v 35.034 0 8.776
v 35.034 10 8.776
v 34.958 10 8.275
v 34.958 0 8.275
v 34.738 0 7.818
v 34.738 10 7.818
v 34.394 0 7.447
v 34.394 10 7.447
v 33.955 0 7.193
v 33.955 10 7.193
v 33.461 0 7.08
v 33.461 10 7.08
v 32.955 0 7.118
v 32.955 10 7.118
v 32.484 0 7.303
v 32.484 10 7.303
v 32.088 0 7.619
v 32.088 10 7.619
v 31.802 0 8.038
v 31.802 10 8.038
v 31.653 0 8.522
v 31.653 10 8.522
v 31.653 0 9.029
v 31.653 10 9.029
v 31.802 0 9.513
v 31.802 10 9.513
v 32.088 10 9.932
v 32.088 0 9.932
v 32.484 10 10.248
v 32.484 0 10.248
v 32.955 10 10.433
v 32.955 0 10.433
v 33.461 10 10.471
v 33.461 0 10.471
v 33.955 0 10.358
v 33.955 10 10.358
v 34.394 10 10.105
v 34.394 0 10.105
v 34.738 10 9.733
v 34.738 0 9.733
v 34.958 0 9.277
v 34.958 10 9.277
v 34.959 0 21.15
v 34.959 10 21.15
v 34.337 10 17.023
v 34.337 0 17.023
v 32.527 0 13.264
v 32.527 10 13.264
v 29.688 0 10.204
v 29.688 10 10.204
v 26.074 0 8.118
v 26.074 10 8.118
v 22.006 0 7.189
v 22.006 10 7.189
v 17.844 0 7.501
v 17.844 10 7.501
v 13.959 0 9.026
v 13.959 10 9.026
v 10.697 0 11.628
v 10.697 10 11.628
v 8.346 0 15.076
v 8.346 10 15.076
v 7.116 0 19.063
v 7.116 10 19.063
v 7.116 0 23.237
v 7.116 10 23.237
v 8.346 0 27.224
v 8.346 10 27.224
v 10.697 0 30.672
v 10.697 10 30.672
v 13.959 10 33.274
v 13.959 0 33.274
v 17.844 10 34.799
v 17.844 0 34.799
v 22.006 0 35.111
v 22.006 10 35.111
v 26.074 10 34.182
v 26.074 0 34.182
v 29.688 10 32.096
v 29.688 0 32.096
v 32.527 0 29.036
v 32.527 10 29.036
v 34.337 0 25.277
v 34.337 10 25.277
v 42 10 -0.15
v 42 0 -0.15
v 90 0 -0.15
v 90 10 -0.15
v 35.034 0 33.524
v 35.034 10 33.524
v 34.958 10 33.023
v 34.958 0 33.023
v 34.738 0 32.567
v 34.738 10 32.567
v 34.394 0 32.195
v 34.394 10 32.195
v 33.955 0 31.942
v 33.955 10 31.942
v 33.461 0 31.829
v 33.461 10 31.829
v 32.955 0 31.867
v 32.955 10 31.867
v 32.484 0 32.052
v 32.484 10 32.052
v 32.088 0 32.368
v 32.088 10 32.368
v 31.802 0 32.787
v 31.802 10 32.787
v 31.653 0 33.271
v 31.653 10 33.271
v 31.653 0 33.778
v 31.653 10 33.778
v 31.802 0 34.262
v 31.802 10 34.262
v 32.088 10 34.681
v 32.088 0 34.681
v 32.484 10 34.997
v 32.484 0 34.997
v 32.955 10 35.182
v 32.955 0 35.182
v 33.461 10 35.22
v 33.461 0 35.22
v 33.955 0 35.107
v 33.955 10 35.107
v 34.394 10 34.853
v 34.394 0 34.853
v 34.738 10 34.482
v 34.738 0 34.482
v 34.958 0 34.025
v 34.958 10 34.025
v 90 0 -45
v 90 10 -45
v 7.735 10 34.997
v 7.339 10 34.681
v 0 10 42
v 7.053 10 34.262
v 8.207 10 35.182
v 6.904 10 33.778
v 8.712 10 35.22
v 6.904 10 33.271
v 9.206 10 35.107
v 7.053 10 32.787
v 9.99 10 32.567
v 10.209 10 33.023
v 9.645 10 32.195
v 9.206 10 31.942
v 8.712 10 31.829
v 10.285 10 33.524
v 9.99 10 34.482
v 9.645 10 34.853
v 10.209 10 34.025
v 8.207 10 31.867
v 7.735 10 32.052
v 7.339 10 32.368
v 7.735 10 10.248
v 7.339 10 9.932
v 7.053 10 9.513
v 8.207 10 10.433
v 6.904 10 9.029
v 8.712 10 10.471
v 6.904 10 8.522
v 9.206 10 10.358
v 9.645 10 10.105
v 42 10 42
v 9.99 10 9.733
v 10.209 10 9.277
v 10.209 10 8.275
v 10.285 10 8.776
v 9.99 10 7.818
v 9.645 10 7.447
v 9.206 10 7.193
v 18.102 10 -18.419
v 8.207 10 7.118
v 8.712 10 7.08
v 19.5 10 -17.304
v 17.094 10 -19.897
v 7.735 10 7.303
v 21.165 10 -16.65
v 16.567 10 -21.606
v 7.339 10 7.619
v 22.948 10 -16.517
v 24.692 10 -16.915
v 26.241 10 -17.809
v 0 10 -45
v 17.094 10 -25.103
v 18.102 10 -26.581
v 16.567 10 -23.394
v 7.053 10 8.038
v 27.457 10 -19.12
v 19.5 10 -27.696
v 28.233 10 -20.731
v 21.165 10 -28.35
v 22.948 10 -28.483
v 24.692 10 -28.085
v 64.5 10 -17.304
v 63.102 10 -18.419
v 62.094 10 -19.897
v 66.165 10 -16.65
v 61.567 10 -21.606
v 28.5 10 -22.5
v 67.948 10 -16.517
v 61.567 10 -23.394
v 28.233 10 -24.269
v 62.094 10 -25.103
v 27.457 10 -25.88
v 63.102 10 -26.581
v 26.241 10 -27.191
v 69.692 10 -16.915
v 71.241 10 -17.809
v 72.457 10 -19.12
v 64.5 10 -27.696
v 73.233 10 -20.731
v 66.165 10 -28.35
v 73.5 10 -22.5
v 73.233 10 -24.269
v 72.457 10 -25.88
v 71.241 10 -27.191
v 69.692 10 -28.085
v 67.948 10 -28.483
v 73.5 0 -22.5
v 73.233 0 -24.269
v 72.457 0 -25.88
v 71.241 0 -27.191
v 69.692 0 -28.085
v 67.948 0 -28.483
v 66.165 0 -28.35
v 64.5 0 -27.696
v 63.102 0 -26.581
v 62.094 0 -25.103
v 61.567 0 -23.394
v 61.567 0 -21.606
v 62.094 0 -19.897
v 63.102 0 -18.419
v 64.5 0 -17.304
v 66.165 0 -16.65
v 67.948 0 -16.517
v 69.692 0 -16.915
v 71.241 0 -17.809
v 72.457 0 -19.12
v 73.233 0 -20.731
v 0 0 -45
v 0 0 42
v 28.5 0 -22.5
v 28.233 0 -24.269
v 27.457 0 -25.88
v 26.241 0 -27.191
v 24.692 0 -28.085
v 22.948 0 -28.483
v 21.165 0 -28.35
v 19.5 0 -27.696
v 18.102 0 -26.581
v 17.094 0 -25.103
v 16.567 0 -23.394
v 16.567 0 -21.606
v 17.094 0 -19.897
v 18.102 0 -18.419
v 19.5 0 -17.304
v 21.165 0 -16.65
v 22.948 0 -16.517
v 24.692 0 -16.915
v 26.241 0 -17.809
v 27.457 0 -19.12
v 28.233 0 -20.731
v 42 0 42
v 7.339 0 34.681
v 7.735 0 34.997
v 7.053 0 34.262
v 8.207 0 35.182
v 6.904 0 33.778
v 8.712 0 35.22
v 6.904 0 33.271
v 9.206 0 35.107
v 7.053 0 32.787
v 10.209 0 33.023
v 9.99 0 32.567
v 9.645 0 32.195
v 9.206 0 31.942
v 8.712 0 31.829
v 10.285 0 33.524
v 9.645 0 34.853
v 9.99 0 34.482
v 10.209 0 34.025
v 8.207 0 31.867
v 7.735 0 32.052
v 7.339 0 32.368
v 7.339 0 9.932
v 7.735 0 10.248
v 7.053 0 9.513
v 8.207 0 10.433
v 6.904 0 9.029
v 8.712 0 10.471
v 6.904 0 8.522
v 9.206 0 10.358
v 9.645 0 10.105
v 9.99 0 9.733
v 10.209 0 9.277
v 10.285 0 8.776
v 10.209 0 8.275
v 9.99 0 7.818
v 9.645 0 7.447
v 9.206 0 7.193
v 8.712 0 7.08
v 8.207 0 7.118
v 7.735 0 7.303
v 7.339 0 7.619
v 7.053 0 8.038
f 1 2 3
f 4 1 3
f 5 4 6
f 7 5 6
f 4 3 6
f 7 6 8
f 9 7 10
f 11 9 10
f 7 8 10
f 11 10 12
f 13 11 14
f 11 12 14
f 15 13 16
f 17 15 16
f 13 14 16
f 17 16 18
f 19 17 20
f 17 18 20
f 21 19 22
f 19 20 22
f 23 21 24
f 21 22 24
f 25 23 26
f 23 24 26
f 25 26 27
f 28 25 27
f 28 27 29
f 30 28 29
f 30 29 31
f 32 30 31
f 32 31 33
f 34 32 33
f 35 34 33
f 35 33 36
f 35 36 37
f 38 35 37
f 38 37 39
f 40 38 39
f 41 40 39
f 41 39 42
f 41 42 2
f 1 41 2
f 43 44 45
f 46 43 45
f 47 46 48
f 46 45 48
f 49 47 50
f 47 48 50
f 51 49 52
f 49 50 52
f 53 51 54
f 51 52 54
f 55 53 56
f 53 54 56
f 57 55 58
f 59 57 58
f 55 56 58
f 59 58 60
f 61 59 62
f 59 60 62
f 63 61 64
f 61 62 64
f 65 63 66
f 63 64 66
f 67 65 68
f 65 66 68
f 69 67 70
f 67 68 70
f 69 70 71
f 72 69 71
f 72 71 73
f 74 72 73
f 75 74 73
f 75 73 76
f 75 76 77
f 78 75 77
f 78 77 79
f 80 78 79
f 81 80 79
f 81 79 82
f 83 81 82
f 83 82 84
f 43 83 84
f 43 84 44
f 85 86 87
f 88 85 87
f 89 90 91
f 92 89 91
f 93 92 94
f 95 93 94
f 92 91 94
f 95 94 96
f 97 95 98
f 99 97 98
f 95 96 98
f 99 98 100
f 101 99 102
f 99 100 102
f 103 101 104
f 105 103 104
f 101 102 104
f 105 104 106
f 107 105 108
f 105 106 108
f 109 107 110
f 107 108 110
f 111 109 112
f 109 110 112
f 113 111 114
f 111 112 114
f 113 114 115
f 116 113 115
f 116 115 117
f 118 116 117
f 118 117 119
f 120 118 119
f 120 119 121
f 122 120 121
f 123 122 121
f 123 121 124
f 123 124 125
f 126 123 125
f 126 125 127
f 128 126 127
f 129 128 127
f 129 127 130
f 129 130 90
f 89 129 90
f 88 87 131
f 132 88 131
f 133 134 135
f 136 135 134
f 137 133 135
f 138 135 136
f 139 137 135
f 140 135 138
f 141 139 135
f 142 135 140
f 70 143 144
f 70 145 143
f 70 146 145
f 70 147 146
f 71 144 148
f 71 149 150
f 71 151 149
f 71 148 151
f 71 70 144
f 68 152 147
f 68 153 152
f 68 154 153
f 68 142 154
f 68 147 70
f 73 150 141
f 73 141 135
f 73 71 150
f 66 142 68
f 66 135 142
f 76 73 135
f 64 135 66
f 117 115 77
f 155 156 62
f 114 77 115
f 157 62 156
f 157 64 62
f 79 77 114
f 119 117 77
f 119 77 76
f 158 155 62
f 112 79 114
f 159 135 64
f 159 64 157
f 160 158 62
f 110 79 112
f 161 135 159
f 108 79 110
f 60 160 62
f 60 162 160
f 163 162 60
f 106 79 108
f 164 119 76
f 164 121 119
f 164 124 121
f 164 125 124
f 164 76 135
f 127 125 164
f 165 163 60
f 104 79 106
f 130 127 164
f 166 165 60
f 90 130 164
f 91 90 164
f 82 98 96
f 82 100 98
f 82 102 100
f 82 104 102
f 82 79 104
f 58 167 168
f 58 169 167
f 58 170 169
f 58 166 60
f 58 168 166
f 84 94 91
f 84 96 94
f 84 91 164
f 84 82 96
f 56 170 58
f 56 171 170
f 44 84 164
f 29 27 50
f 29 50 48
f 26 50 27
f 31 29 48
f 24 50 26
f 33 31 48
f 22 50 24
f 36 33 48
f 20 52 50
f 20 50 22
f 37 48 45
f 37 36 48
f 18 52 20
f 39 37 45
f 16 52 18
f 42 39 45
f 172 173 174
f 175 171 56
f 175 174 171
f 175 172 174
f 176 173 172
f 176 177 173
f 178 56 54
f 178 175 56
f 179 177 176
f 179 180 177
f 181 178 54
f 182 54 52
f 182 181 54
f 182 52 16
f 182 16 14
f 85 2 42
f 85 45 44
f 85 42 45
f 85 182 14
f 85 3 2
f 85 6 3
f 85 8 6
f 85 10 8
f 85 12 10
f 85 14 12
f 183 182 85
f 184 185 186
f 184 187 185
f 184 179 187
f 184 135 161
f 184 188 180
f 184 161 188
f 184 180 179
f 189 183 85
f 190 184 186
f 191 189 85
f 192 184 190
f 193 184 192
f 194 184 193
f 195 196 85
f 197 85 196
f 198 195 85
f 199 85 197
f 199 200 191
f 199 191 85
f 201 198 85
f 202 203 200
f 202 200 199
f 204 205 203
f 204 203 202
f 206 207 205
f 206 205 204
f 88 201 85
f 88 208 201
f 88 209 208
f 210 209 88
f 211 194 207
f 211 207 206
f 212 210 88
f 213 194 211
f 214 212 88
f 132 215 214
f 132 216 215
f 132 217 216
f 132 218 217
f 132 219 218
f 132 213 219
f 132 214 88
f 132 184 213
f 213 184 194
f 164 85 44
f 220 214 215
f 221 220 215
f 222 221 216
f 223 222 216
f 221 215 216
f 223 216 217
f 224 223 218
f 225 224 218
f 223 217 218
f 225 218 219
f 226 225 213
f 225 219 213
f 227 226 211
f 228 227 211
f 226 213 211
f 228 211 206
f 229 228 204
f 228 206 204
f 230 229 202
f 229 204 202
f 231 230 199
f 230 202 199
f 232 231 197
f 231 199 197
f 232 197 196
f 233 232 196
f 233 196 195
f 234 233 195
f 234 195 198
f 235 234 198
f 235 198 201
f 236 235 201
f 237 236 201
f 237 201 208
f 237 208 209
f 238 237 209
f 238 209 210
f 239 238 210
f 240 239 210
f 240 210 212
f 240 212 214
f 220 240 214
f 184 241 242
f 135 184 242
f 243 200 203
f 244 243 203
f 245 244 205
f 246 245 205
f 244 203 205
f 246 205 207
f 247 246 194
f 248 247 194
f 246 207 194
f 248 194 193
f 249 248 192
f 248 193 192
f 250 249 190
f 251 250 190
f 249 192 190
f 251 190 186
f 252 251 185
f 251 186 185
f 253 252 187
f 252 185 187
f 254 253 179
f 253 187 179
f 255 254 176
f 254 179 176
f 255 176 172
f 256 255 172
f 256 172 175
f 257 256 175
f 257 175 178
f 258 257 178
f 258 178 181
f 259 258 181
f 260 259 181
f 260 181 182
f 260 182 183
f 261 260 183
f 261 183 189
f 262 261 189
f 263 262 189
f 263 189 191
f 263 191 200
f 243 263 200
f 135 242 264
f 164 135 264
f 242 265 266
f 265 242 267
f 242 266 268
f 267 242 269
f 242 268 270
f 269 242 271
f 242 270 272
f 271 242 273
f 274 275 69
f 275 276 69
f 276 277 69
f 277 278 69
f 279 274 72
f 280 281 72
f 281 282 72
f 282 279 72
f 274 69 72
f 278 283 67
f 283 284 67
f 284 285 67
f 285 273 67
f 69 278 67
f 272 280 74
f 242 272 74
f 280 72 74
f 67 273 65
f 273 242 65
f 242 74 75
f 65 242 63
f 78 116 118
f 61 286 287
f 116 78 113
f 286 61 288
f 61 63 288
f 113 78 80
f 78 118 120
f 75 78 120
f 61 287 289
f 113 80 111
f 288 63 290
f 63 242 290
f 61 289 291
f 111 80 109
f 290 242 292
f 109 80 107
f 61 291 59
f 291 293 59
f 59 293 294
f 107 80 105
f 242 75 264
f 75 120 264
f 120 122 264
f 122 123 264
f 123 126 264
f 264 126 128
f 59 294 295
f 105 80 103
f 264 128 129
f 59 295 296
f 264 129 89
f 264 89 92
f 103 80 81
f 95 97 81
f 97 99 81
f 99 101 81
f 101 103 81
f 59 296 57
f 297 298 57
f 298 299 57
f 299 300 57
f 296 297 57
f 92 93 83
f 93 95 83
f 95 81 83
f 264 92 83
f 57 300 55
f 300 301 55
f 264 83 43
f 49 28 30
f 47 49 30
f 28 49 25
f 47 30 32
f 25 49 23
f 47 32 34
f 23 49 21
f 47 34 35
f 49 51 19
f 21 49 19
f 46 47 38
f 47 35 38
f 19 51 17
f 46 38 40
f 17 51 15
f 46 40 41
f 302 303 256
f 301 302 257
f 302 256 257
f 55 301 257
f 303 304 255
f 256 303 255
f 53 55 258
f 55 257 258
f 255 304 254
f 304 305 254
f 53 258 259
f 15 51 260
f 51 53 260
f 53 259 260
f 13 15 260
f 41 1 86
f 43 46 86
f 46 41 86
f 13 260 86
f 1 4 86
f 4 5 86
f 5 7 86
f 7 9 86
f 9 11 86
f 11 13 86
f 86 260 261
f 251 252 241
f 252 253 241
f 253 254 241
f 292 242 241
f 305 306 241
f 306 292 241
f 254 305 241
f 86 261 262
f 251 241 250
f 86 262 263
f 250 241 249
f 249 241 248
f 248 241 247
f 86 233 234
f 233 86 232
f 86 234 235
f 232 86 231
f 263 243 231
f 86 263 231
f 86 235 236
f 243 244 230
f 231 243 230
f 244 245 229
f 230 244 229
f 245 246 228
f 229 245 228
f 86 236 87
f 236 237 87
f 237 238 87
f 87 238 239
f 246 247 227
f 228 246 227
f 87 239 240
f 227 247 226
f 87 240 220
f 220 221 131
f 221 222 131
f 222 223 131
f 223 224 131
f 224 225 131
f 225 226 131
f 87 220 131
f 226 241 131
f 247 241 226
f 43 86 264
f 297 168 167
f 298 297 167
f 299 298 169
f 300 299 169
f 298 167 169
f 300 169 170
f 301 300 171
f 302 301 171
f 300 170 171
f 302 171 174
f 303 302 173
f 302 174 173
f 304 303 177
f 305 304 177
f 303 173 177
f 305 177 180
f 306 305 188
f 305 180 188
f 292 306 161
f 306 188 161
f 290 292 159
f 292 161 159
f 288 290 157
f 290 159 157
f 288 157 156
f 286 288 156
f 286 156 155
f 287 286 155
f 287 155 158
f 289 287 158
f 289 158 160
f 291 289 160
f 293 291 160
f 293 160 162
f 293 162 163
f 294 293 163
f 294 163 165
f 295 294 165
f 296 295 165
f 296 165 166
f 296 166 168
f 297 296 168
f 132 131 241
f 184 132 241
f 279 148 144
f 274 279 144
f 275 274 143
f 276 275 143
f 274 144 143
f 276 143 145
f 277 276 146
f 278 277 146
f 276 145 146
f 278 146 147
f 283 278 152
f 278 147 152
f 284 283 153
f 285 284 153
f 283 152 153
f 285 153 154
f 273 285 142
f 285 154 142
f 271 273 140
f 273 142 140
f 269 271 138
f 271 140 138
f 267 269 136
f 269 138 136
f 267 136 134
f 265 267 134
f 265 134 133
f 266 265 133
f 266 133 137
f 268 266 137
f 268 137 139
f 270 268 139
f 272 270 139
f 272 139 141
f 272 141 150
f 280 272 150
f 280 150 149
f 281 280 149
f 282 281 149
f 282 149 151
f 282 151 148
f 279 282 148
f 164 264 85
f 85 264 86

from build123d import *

# Parameters (mm, degrees)
EXTRUDE_1_DEPTH     = 10
SKETCH_2_R          = 6
CUT_EXTRUDE_1_DEPTH = 11
SKETCH_3_R          = 14
SKETCH_3_R_2        = 1.7
CUT_EXTRUDE_2_DEPTH = 11


with BuildPart() as part:
    # Эскиз1 → Бобышка-Вытянуть1 (new body)
    with BuildSketch(Plane(origin=(0, 0, 0), x_dir=(1, 0, 0), z_dir=(0, 1, 0))):
        Polygon((42, 0.149999792), (89.999875, 0.149999792), (89.999875, 45), (0, 45), (0, 0), (0, -42), (42, -42), align=None)
    extrude(amount=EXTRUDE_1_DEPTH)

    # Эскиз2 → Вырез-Вытянуть1 (cut, through all)
    with BuildSketch(Plane(origin=(0, 10, 0), x_dir=(1, 0, 0), z_dir=(0, 1, 0))):
        with Locations((67.5, 22.5)):
            Circle(SKETCH_2_R)
        with Locations((22.5, 22.5)):
            Circle(SKETCH_2_R)
    extrude(amount=-CUT_EXTRUDE_1_DEPTH, mode=Mode.SUBTRACT)

    # Эскиз3 → Вырез-Вытянуть2 (cut, through all)
    with BuildSketch(Plane(origin=(0, 10, 0), x_dir=(1, 0, 0), z_dir=(0, 1, 0))):
        with Locations((20.959394321, -21.15)):
            Circle(SKETCH_3_R)
        with Locations((33.333762992, -33.524368671)):
            Circle(SKETCH_3_R_2)
        with Locations((8.585025651, -33.524368671)):
            Circle(SKETCH_3_R_2)
        with Locations((8.585025651, -8.775631329)):
            Circle(SKETCH_3_R_2)
        with Locations((33.333762992, -8.775631329)):
            Circle(SKETCH_3_R_2)
    extrude(amount=-CUT_EXTRUDE_2_DEPTH, mode=Mode.SUBTRACT)


solid = part.part
